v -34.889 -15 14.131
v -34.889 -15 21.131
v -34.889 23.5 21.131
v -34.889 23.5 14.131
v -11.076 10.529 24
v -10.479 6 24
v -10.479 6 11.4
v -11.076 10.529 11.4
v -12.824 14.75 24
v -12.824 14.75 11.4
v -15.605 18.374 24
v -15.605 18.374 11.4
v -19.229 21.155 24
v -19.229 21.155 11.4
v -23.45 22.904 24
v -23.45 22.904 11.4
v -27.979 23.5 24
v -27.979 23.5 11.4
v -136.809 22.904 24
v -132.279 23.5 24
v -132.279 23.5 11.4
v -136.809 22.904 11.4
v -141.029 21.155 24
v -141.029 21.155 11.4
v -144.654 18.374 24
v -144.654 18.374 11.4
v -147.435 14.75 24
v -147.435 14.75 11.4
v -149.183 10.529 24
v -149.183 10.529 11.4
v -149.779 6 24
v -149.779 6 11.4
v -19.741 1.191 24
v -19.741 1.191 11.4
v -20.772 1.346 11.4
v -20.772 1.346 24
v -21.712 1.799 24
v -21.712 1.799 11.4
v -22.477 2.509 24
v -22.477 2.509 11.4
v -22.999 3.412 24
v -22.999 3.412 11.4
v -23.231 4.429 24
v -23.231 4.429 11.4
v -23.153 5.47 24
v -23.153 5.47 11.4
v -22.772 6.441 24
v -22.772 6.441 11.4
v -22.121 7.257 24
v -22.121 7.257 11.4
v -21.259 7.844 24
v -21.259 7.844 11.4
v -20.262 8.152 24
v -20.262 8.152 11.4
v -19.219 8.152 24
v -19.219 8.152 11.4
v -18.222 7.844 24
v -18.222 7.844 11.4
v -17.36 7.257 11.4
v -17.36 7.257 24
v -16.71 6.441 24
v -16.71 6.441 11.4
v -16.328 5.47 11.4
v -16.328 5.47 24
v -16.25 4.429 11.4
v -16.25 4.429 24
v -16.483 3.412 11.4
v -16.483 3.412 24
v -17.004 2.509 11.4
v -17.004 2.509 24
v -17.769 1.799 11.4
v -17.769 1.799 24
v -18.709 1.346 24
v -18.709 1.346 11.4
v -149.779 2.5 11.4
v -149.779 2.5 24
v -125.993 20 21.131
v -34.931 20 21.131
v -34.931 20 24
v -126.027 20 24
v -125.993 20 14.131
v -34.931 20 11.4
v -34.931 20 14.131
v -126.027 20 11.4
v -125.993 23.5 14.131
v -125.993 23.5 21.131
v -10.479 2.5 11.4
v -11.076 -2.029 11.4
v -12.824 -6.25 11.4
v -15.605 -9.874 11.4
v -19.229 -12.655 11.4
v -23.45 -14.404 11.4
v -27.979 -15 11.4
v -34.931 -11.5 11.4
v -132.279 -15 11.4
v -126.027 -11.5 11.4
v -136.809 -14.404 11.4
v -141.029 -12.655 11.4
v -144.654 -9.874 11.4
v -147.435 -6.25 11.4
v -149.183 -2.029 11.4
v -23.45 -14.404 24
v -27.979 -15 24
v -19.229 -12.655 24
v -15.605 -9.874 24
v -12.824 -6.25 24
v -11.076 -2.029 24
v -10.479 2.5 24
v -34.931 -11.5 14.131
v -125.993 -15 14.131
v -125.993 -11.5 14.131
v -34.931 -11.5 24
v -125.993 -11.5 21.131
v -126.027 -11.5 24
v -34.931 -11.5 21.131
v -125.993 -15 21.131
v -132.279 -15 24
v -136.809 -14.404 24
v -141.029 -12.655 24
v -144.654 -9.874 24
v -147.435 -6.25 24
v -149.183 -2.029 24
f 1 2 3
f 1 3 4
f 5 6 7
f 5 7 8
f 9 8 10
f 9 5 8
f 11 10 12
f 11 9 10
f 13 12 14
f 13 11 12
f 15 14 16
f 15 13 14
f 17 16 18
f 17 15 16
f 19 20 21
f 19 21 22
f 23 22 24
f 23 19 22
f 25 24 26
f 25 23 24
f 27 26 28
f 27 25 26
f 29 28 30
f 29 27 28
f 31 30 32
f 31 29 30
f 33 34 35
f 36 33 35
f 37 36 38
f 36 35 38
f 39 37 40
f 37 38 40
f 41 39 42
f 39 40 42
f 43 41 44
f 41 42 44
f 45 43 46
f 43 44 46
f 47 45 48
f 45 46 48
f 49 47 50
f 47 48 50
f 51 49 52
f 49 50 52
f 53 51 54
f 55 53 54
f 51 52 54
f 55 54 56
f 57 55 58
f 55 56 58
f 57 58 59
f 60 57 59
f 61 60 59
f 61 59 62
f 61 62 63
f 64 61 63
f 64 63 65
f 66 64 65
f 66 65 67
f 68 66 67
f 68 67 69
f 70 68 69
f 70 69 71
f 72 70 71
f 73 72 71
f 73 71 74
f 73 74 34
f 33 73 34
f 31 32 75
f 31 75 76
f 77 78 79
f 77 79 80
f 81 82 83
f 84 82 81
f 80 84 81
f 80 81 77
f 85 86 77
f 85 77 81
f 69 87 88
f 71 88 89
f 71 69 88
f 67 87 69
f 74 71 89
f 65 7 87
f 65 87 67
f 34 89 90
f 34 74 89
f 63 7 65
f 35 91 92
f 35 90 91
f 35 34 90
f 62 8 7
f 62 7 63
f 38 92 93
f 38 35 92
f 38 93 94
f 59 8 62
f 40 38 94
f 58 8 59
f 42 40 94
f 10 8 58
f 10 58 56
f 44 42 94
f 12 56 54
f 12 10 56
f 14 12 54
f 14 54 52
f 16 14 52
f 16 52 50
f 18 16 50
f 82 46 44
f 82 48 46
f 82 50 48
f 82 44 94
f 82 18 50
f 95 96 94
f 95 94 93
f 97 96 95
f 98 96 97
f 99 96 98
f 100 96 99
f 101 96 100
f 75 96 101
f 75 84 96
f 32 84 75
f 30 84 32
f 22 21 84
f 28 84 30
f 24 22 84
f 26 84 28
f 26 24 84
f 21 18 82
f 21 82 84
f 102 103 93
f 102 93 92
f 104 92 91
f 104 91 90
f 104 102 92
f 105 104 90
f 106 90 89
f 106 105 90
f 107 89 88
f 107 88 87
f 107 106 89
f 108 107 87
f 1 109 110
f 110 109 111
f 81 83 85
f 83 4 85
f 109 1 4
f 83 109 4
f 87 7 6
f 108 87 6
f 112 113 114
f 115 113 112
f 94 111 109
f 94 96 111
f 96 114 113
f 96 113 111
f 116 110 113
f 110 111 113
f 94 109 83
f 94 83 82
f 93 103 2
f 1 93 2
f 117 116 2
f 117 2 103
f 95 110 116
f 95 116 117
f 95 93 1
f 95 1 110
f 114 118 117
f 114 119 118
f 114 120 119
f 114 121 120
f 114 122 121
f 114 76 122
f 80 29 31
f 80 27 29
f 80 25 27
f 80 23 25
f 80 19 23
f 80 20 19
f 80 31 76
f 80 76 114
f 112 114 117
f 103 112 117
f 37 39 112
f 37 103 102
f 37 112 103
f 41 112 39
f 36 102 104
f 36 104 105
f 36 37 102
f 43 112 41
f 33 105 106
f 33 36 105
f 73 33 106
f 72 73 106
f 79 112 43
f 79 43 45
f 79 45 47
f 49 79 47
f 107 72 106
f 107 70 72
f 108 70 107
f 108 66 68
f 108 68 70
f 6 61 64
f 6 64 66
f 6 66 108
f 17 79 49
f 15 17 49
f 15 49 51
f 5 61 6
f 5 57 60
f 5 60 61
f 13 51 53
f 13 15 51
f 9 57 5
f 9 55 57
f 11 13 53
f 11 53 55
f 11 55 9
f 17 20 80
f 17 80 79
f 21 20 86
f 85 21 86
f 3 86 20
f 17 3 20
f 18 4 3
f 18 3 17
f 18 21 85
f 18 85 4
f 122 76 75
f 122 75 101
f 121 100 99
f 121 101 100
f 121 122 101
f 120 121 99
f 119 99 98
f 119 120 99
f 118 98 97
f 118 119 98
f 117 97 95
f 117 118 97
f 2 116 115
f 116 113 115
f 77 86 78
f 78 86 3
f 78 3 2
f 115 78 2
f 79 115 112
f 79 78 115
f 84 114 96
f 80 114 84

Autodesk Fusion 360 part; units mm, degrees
sketch "Sketch1" plane through (0, 0, 0) normal (0, 0, 1) x (1, 0, 0)
  line L0 (0, 0) -> (-200, 0)
  line L1 (-200, 0) -> (-200, 25)
  line L2 (-200, 25) -> (0, 25)
  line L3 (0, 25) -> (0, 0)
extrude "Extrude1" add sketch "Sketch1" along normal blind 30
ref_plane "WorkPlane2" through (-100, 12.5, 15) normal (1, 0, 0) x (0, 1, 0)
sketch "Sketch2" plane through (0, 0, 0) normal (0, -1, 0) x (1, 0, 0)
  line L0 (-200, 0) -> (0, 0)
  line L1 (0, 0) -> (0, 30)
  line L2 (0, 30) -> (-200, 30)
  line L3 (-200, 30) -> (-200, 0)
ref_plane "WorkPlane1" through (-100, 12.5, 15) normal (0, 0, 1) x (1, 0, 0)
sketch "Sketch3" plane through (0, 0, 15) normal (0, 0, 1) x (1, 0, 0)
  line L0 (-200, 25) -> (-180, 25)
  line L1 (-180, 25) -> (-180, 0)
  line L2 (-180, 0) -> (-200, 0)
  line L3 (-200, 0) -> (-200, 25)
extrude "Extrude2" cut 1 faces at (-200, 8.3333, 20) along direction (1, 0, 0) blind 1
sketch "Sketch4" plane through (0, 0, 30) normal (0, 0, 1) x (-1, 0, 0)
  line L0 (0, -25) -> (199, -25)
  line L1 (199, 0) -> (0, 0)
  line L2 (0, 0) -> (22, 0)
  line L3 (22, 0) -> (22, -25)
  line L4 (22, -25) -> (0, -25)
  line L5 (0, -25) -> (0, 0)
  line L6 (199, -25) -> (199, 0)
  line L7 (0, 0) -> (0, -25)
extrude "Extrude3" cut sketch "Sketch4" against normal blind 6 contours L0 L1 L2 L3 L4 L5 L7
sketch "Sketch5" plane through (0, 0, 0) normal (0, 0, -1) x (1, 0, 0)
  line L0 (0, 0) -> (-199, 0)
  line L1 (-199, -25) -> (0, -25)
  line L2 (0, 0) -> (-22, 0)
  line L3 (-22, 0) -> (-22, -25)
  line L4 (-22, -25) -> (0, -25)
  line L5 (0, -25) -> (0, 0)
  line L6 (-199, 0) -> (-199, -25)
  line L7 (0, -25) -> (0, 0)
extrude "Extrude4" cut sketch "Sketch5" against normal blind 6 contours L0 L1 L2 L3 L4 L5 L7
sketch "Sketch6" plane through (0, 0, 30) normal (0, 0, 1) x (-1, 0, 0)
  line L0 (199, 0) -> (22, 0)
  line L1 (22, 0) -> (22, -25)
  line L2 (22, -25) -> (199, -25)
  line L3 (34.9313, -5) -> (165.0687, -5)
  line L4 (165.0687, -5) -> (165.0687, -20)
  line L5 (165.0687, -20) -> (34.9313, -20)
  line L6 (34.9313, -20) -> (34.9313, -5)
  line L7 (199, -25) -> (199, 0)
extrude "Extrude5" cut sketch "Sketch6" against normal blind 43 contours L3 L4 L5 L6
sketch "Sketch7" plane through (0, 25, 0) normal (0, 1, 0) x (-1, 0, 0)
  line L0 (199, 30) -> (22, 30)
  line L1 (22, 30) -> (22, 24)
  line L2 (22, 24) -> (0, 24)
  line L3 (0, 6) -> (22, 6)
  line L4 (22, 6) -> (22, 0)
  line L5 (22, 0) -> (199, 0)
  line L6 (34.8715, 24.9016) -> (165.0188, 24.9016)
  line L7 (165.0188, 24.9016) -> (165.0188, 4.9016)
  line L8 (165.0188, 4.9016) -> (34.8715, 4.9016)
  line L9 (34.8715, 4.9016) -> (34.8715, 24.9016)
  line L10 (199, 0) -> (199, 30)
  line L11 (0, 24) -> (0, 6)
  dimension "d20" = 20
extrude "Extrude6" cut sketch "Sketch7" against normal blind 50 contours L6 L7 L8 L9
sketch "Sketch8" plane through (0, 25, 0) normal (0, 1, 0) x (-1, 0, 0)
sketch "Sketch9" plane through (0, 0, 30) normal (0, 0, 1) x (-1, 0, 0)
  line L0 (165.0687, -5) -> (165.0687, -20)
  line L1 (165.0687, -20) -> (34.9313, -20)
  line L2 (34.9313, -20) -> (34.9313, -5)
  line L3 (34.9313, -5) -> (165.0687, -5)
  line L4 (199, 0) -> (22, 0)
  line L5 (22, 0) -> (22, -25)
  line L6 (22, -25) -> (199, -25)
  line L7 (22, -17.5) -> (37.5, -25)
  line L8 (22, -25) -> (37.5, -25)
  line L9 (22, -25) -> (22, -17.5)
  line L10 (199, -25) -> (199, 0)
ref_plane "WorkPlane3" through (-99.5, 12.5, 15) normal (0, 1, 0) x (-1, 0, 0)
sketch "Sketch10" plane through (0, 0, 30) normal (0, 0, 1) x (-1, 0, 0)
extrude "Extrude7" add 1 faces at (-78.2739, 1.6667, 24.9016) along direction (0, 0, -1) blind 5
extrude "Extrude8" add 1 faces at (-78.2739, 1.6667, 4.9016) along direction (0, 0, 1) blind 5
sketch "Sketch11" plane through (-22, 0, 0) normal (1, 0, 0) x (0, 1, 0)
  line L0 (25, 30) -> (0, 30)
  line L1 (0, 30) -> (0, 24)
  line L2 (0, 24) -> (25, 24)
  line L3 (25, 24) -> (25, 30)
  line L4 (0, 30) -> (25, 30)
  line L5 (25, 30) -> (25, 24)
  line L6 (25, 24) -> (0, 24)
  line L7 (0, 24) -> (0, 30)
  line L8 (0, 6) -> (25, 6)
  line L9 (25, 6) -> (25, 0)
  line L10 (25, 0) -> (0, 0)
  line L11 (0, 0) -> (0, 6)
extrude "Extrude9" cut sketch "Sketch11" against normal blind 220
sketch "Sketch12" plane through (0, 0, 24) normal (0, 0, 1) x (-1, 0, 0)
  line L0 (34.9313, -5) -> (165.0687, -5)
  line L1 (165.0687, -5) -> (165.0687, -20)
  line L2 (165.0687, -20) -> (34.9313, -20)
  line L3 (34.9313, -20) -> (34.9313, -5)
  line L4 (0, -25) -> (199, -25)
  line L5 (199, 0) -> (0, 0)
  line L6 (25, -25) -> (25, 0)
  line L7 (199, -25) -> (199, 0)
  line L8 (0, 0) -> (0, -25)
extrude "Extrude10" add 1 faces at (-187.6729, 0, 16.6339) along direction (0, -1, 0) blind 30
sketch "Sketch13" plane through (0, 0, 24) normal (0, 0, 1) x (-1, 0, 0)
  line L0 (34.9313, -5) -> (165.0687, -5)
  line L1 (165.0687, -5) -> (165.0687, -20)
  line L2 (165.0687, -20) -> (34.9313, -20)
  line L3 (34.9313, -20) -> (34.9313, -5)
  line L4 (0, -25) -> (199, -25)
  line L5 (199, 30) -> (0, 30)
  line L6 (165, -5) -> (35, -5)
  line L7 (35, -5) -> (35, 25)
  line L8 (35, 25) -> (165, 25)
  line L9 (165, 25) -> (165, -5)
  line L10 (35, -5) -> (165, -5)
  line L11 (165, -5) -> (165, 25)
  line L12 (165, 25) -> (35, 25)
  line L13 (35, 25) -> (35, -5)
  line L14 (199, -25) -> (199, 30)
  line L15 (0, 30) -> (0, -25)
sketch "Sketch14" plane through (0, 0, 24) normal (0, 0, 1) x (-1, 0, 0)
  line L0 (34.9313, -5) -> (165.0687, -5)
  line L1 (165.0687, -5) -> (165.0687, -20)
  line L2 (165.0687, -20) -> (34.9313, -20)
  line L3 (34.9313, -20) -> (34.9313, -5)
  line L4 (0, -25) -> (199, -25)
  line L5 (199, 30) -> (0, 30)
  line L6 (165, -5) -> (35, -5)
  line L7 (35, -5) -> (35, 25)
  line L8 (35, 25) -> (165, 25)
  line L9 (165, 25) -> (165, -5)
  line L10 (35, 25) -> (165, 25)
  line L11 (165, 25) -> (165, -5)
  line L12 (165, -5) -> (35, -5)
  line L13 (35, -5) -> (35, 25)
  line L14 (199, -25) -> (199, 30)
  line L15 (0, 30) -> (0, -25)
extrude "Extrude11" cut 1 faces at (-121.6729, 5, 22.6339) along direction (0, -1, 0) blind 30
fillet "Fillet3" radius 25 2 edges at (0, 25, 15) (0, -30, 15)
fillet "Fillet4" radius 25 2 edges at (-199, 25, 15) (-199, -30, 15)
hole "Hole2" at (-13.2303, -1.87, 24) direction (0, 0, -1) diameter 10 depth 40 tip angle 118
scale "Scale1" factor 0.7 about (-34.9313, 20, 24) bodies 1
